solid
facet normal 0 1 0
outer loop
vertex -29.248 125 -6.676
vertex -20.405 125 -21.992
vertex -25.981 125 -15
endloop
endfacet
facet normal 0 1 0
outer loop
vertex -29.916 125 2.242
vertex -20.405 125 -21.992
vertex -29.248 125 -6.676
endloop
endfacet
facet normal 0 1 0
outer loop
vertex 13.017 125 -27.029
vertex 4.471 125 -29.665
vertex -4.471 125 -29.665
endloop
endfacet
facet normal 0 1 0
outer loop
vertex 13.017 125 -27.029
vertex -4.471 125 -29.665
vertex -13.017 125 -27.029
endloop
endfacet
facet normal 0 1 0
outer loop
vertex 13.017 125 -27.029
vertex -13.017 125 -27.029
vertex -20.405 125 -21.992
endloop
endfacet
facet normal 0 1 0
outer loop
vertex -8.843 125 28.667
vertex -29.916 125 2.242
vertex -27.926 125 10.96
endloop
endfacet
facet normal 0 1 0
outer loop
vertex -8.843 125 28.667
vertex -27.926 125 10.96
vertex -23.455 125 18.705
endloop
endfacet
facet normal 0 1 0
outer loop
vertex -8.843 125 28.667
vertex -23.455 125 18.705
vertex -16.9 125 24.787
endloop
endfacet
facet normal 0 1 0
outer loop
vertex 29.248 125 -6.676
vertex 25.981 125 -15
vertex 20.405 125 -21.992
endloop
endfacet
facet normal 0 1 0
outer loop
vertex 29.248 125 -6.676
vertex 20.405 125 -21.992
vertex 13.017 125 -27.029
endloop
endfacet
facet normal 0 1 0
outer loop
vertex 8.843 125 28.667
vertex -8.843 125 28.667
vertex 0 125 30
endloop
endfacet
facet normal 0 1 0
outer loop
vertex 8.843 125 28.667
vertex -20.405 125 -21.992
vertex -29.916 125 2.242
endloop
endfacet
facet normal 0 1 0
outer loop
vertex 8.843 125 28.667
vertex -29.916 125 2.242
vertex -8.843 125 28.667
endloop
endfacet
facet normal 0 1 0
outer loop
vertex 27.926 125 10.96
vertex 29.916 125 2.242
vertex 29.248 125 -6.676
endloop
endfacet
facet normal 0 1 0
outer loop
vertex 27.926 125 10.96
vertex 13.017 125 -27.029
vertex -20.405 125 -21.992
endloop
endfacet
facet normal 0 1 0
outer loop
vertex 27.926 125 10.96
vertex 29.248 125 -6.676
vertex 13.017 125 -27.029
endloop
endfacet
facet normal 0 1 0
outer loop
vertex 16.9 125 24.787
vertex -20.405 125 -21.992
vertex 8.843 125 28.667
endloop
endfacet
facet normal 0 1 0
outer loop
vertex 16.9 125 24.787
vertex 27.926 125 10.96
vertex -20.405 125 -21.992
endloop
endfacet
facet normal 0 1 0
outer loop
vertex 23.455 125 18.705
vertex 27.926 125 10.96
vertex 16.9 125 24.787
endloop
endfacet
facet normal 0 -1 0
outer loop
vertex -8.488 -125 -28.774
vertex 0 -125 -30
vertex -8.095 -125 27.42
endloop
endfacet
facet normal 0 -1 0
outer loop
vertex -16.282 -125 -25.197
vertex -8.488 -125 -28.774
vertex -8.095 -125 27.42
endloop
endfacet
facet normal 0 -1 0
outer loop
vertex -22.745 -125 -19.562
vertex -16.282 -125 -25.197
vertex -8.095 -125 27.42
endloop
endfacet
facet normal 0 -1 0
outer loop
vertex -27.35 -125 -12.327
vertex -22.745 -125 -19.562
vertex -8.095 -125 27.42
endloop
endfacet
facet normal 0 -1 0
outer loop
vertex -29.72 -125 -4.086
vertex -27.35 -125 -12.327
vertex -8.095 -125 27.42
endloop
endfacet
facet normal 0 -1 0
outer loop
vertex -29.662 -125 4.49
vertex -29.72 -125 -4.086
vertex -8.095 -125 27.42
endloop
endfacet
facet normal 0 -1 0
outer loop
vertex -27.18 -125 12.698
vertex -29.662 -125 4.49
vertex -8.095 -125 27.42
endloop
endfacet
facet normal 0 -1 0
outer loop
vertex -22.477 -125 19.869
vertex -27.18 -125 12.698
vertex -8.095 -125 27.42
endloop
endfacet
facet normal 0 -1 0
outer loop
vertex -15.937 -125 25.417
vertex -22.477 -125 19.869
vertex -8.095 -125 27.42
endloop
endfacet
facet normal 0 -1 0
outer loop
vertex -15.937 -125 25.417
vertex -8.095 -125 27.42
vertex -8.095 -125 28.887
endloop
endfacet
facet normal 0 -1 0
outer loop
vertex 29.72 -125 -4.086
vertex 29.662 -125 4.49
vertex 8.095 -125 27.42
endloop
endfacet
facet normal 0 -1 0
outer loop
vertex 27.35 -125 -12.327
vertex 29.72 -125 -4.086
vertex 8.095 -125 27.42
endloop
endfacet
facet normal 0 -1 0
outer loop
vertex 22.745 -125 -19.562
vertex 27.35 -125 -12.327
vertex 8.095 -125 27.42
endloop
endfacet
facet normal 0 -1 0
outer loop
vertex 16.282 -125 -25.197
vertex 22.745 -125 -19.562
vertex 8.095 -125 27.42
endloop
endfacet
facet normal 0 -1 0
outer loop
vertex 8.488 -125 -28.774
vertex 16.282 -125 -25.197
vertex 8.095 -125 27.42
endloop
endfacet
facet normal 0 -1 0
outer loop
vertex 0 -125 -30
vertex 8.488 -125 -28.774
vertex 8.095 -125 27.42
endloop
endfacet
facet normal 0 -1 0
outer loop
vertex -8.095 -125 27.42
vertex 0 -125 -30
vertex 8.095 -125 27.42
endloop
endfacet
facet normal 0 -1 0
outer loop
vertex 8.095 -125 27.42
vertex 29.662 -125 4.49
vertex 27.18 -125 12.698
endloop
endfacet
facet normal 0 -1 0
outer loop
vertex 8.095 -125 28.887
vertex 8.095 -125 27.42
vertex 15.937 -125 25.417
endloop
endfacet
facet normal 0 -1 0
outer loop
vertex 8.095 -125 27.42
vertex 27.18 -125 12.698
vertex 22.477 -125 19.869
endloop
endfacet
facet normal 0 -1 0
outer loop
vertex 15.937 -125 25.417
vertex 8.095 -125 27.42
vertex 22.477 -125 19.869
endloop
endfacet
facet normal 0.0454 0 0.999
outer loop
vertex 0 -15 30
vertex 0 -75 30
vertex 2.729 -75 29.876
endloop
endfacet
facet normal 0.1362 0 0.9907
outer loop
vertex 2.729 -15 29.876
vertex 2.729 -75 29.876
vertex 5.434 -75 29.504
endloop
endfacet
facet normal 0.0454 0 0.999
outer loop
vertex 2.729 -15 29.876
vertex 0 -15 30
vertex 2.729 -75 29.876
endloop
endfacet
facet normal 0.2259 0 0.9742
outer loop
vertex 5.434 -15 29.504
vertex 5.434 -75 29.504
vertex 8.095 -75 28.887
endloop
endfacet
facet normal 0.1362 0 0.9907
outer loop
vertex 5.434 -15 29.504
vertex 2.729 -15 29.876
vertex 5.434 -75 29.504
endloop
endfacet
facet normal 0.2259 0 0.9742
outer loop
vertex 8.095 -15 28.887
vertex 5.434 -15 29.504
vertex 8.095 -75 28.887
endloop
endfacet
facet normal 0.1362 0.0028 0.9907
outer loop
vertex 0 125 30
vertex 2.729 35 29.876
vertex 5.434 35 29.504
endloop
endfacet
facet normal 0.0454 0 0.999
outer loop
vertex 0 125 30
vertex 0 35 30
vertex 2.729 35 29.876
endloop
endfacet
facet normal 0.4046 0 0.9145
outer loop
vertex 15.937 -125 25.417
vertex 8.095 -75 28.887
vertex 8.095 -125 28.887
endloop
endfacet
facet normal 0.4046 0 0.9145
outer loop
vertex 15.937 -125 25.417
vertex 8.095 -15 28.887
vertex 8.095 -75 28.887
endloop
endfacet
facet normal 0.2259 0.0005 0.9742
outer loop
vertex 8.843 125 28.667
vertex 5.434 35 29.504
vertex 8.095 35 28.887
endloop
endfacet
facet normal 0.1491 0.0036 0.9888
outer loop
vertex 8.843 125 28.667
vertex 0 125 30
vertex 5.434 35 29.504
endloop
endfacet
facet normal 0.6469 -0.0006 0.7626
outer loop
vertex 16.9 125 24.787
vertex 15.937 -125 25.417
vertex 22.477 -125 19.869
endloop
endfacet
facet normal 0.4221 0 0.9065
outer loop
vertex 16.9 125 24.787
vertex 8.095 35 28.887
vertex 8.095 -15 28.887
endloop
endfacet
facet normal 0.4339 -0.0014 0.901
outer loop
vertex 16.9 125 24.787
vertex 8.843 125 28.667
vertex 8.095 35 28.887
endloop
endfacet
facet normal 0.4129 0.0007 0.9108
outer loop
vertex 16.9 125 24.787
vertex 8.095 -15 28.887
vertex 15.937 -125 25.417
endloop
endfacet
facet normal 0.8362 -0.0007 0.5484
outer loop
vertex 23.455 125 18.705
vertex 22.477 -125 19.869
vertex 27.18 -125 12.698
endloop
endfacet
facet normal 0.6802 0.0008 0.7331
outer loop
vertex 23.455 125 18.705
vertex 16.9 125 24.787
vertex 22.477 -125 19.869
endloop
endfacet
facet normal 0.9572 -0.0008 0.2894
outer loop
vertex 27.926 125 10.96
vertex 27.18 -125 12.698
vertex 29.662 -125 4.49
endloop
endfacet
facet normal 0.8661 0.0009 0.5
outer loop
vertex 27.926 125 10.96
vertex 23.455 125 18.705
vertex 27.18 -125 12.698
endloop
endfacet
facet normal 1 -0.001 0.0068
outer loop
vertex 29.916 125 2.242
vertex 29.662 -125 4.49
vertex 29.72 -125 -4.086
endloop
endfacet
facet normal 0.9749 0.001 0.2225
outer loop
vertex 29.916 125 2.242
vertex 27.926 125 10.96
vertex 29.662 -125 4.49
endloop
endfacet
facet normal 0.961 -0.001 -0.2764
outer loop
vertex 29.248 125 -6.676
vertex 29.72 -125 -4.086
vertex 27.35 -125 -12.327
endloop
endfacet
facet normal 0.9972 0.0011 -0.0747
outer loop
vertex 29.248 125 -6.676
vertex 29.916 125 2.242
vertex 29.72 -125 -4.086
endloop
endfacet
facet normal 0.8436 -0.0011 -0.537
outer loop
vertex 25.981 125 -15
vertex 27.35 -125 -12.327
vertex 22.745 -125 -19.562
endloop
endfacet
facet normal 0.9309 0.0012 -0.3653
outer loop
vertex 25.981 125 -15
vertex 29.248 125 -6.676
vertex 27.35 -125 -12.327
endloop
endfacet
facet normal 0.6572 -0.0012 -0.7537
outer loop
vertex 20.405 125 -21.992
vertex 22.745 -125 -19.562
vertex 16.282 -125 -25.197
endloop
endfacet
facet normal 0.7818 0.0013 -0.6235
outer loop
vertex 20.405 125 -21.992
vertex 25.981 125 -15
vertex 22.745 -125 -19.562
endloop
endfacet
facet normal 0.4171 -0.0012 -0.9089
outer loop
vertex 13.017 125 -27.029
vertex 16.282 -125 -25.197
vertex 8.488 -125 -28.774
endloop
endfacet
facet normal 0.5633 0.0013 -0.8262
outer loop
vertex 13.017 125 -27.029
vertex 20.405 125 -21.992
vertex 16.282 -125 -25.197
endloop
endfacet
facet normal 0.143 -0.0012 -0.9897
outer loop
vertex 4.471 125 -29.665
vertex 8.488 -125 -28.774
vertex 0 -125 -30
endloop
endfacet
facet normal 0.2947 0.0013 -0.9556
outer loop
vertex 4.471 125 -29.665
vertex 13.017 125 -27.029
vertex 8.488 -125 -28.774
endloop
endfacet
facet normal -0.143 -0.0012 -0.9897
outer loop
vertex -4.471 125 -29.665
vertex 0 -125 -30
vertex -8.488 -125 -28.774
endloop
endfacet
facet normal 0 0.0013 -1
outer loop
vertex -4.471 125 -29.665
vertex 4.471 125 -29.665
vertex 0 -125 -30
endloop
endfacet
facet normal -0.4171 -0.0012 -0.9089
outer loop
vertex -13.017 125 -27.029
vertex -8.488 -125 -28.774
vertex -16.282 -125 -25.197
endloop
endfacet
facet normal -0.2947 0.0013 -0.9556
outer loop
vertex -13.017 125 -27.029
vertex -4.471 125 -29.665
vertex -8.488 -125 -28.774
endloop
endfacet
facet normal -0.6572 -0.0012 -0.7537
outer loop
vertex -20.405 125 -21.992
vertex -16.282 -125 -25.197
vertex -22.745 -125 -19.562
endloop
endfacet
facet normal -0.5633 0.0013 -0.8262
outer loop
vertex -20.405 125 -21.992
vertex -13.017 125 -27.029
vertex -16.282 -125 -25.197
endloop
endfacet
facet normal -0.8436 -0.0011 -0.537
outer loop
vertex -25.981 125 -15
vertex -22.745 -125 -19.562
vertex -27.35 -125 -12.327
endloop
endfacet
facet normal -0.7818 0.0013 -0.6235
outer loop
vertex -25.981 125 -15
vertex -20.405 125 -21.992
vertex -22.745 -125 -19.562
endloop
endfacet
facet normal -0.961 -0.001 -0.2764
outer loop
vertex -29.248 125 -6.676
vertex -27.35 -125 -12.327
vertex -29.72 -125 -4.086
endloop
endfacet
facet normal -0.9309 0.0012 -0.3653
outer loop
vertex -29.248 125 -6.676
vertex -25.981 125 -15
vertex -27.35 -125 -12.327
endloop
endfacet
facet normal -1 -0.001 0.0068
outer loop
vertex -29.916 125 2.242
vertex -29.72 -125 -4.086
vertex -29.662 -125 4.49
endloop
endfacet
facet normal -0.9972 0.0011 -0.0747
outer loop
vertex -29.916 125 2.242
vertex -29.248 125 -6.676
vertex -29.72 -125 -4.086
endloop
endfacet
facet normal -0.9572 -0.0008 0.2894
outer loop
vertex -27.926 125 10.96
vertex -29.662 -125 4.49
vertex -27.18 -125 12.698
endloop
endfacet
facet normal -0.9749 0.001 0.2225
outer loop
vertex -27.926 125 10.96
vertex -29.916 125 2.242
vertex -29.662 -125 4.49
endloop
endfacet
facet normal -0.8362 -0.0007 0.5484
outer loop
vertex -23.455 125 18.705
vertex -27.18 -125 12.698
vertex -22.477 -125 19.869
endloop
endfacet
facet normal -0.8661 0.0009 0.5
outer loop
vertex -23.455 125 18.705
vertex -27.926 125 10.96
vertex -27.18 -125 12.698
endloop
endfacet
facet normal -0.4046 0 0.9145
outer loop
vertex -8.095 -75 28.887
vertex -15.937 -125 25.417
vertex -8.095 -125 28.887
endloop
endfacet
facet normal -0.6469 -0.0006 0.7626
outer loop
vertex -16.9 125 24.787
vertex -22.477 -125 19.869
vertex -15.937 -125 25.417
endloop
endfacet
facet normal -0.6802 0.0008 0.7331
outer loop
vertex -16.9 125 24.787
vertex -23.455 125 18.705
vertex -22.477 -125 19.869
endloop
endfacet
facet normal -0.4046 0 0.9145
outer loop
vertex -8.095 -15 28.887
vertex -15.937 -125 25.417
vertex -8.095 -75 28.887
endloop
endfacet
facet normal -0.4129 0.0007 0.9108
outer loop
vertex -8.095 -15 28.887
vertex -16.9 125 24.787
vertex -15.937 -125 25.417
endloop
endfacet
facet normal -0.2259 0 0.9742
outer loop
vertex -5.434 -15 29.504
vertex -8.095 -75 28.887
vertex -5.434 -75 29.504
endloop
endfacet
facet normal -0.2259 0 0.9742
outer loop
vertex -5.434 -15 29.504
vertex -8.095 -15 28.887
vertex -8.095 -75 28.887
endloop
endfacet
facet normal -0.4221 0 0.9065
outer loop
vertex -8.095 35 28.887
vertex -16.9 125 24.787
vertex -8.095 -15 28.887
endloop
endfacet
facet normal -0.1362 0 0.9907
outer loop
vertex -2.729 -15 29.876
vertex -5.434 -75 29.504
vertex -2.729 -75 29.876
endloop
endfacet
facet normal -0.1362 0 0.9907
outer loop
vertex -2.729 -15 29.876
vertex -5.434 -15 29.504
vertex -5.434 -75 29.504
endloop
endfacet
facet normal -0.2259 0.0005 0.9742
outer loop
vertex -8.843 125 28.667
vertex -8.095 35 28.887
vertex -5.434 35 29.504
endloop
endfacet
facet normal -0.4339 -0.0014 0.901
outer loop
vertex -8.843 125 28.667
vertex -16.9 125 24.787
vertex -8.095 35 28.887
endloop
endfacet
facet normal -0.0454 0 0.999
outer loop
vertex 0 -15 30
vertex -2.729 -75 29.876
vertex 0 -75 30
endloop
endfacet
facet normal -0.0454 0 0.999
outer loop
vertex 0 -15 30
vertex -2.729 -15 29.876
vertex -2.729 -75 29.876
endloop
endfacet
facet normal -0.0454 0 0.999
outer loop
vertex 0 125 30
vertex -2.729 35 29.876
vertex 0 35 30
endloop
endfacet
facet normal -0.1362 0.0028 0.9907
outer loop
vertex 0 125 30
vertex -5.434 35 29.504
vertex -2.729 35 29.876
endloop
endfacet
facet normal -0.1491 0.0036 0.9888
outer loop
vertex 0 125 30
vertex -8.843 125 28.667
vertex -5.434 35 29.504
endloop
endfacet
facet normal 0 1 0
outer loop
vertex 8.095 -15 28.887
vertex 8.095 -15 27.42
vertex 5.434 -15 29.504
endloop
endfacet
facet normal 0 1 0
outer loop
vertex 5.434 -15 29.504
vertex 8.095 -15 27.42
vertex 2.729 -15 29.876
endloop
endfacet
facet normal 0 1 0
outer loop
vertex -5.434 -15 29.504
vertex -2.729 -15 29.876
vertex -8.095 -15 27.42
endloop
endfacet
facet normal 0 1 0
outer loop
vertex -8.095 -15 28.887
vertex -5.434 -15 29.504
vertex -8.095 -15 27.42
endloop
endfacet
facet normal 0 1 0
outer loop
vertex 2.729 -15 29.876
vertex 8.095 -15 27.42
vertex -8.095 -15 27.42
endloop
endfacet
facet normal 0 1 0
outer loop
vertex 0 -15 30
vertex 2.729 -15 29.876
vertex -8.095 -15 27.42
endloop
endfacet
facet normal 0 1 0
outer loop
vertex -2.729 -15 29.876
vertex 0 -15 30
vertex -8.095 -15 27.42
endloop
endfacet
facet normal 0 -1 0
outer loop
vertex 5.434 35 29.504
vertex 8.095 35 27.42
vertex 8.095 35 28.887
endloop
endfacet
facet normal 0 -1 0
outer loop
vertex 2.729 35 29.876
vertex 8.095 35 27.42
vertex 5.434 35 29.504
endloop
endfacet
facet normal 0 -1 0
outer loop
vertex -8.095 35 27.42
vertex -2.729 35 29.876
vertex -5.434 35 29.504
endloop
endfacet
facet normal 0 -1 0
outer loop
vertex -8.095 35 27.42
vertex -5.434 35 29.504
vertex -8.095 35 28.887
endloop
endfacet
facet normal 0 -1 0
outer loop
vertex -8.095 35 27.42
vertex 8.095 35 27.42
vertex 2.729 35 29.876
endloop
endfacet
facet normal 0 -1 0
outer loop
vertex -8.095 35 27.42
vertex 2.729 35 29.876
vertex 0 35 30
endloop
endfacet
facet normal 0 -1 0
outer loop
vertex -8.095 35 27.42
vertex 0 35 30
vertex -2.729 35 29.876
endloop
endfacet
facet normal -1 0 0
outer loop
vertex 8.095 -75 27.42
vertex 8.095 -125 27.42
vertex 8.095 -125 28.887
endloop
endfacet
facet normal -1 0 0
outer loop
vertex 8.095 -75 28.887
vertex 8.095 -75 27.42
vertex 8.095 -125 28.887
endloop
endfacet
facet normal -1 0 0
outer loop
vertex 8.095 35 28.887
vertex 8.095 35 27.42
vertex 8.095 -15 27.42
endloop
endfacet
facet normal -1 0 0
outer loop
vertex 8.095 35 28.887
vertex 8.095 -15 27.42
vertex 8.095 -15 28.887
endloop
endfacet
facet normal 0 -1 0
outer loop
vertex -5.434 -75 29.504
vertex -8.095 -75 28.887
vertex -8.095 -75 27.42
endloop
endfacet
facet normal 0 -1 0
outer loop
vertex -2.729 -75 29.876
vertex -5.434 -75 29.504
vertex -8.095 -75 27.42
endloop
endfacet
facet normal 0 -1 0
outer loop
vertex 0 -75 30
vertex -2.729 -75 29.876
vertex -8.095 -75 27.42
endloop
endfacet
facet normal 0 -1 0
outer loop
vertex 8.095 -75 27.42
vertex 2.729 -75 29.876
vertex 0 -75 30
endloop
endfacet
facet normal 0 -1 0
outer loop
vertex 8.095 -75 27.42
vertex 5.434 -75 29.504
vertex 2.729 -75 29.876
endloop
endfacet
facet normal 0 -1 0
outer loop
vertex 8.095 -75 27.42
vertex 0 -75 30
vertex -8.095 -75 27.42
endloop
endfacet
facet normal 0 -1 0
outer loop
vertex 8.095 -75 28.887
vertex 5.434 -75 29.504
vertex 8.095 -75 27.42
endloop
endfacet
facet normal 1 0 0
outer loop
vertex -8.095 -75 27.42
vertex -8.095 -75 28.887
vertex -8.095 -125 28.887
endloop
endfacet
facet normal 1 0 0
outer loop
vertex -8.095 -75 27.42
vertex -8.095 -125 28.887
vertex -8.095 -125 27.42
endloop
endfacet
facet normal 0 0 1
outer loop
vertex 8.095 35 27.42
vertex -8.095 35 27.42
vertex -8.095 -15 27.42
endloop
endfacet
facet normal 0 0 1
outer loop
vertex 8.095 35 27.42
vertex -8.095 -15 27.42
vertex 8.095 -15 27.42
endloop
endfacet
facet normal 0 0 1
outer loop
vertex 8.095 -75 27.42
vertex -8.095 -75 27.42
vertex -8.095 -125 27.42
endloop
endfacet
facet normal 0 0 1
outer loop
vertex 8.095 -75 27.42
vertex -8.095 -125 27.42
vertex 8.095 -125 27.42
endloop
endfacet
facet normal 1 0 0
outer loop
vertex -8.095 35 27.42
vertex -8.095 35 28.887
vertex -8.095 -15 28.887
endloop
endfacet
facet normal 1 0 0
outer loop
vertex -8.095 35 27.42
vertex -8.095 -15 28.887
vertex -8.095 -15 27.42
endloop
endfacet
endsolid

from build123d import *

# Parameters (mm, degrees)
SKETCH2_R           = 30
BOSS_EXTRUDE1_DEPTH = 125
CUT_EXTRUDE1_START  = -50
CUT_EXTRUDE1_DEPTH  = 50
CUT_EXTRUDE2_START  = -50
CUT_EXTRUDE2_DEPTH  = 50


with BuildPart() as part:
    # Sketch2 → Boss-Extrude1 (new, symmetric)
    with BuildSketch(Plane(origin=(0, 0, 0), x_dir=(1, 0, 0), z_dir=(0, 1, 0))):
        with Locations(Location((0, 0, 0), (0, 0, 270))):
            Circle(SKETCH2_R)
    extrude(amount=BOSS_EXTRUDE1_DEPTH, both=True)

    # Sketch3 → Cut-Extrude1 (cut)
    with BuildSketch(Plane.XZ.offset(125).offset(CUT_EXTRUDE1_START)):
        with BuildLine():
            ThreePointArc((-8.095335695, 28.887117197), (0, 30), (8.095335695, 28.887117197))
            Line((8.095335695, 28.887117197), (8.095335695, 34.42))
            Line((8.095335695, 34.42), (-8.095335695, 34.42))
            Line((-8.095335695, 34.42), (-8.095335695, 28.887117197))
        make_face()
        with BuildLine():
            Line((-8.095335695, 27.42), (8.095335695, 27.42))
            Line((8.095335695, 27.42), (8.095335695, 28.887117197))
            ThreePointArc((8.095335695, 28.887117197), (0, 30), (-8.095335695, 28.887117197))
            Line((-8.095335695, 28.887117197), (-8.095335695, 27.42))
        make_face()
    extrude(amount=CUT_EXTRUDE1_DEPTH, mode=Mode.SUBTRACT)

    # Sketch4 → Cut-Extrude2 (cut)
    with BuildSketch(Plane(origin=(0, -15, 0), x_dir=(-1, 0, 0), z_dir=(0, -1, 0)).offset(CUT_EXTRUDE2_START)):
        with BuildLine():
            Line((8.095335695, -28.887117197), (8.095335695, -27.42))
            Line((8.095335695, -27.42), (-8.095335695, -27.42))
            Line((-8.095335695, -27.42), (-8.095335695, -28.887117197))
            ThreePointArc((-8.095335695, -28.887117197), (0, -30), (8.095335695, -28.887117197))
        make_face()
    extrude(amount=CUT_EXTRUDE2_DEPTH, mode=Mode.SUBTRACT)


solid = part.part
